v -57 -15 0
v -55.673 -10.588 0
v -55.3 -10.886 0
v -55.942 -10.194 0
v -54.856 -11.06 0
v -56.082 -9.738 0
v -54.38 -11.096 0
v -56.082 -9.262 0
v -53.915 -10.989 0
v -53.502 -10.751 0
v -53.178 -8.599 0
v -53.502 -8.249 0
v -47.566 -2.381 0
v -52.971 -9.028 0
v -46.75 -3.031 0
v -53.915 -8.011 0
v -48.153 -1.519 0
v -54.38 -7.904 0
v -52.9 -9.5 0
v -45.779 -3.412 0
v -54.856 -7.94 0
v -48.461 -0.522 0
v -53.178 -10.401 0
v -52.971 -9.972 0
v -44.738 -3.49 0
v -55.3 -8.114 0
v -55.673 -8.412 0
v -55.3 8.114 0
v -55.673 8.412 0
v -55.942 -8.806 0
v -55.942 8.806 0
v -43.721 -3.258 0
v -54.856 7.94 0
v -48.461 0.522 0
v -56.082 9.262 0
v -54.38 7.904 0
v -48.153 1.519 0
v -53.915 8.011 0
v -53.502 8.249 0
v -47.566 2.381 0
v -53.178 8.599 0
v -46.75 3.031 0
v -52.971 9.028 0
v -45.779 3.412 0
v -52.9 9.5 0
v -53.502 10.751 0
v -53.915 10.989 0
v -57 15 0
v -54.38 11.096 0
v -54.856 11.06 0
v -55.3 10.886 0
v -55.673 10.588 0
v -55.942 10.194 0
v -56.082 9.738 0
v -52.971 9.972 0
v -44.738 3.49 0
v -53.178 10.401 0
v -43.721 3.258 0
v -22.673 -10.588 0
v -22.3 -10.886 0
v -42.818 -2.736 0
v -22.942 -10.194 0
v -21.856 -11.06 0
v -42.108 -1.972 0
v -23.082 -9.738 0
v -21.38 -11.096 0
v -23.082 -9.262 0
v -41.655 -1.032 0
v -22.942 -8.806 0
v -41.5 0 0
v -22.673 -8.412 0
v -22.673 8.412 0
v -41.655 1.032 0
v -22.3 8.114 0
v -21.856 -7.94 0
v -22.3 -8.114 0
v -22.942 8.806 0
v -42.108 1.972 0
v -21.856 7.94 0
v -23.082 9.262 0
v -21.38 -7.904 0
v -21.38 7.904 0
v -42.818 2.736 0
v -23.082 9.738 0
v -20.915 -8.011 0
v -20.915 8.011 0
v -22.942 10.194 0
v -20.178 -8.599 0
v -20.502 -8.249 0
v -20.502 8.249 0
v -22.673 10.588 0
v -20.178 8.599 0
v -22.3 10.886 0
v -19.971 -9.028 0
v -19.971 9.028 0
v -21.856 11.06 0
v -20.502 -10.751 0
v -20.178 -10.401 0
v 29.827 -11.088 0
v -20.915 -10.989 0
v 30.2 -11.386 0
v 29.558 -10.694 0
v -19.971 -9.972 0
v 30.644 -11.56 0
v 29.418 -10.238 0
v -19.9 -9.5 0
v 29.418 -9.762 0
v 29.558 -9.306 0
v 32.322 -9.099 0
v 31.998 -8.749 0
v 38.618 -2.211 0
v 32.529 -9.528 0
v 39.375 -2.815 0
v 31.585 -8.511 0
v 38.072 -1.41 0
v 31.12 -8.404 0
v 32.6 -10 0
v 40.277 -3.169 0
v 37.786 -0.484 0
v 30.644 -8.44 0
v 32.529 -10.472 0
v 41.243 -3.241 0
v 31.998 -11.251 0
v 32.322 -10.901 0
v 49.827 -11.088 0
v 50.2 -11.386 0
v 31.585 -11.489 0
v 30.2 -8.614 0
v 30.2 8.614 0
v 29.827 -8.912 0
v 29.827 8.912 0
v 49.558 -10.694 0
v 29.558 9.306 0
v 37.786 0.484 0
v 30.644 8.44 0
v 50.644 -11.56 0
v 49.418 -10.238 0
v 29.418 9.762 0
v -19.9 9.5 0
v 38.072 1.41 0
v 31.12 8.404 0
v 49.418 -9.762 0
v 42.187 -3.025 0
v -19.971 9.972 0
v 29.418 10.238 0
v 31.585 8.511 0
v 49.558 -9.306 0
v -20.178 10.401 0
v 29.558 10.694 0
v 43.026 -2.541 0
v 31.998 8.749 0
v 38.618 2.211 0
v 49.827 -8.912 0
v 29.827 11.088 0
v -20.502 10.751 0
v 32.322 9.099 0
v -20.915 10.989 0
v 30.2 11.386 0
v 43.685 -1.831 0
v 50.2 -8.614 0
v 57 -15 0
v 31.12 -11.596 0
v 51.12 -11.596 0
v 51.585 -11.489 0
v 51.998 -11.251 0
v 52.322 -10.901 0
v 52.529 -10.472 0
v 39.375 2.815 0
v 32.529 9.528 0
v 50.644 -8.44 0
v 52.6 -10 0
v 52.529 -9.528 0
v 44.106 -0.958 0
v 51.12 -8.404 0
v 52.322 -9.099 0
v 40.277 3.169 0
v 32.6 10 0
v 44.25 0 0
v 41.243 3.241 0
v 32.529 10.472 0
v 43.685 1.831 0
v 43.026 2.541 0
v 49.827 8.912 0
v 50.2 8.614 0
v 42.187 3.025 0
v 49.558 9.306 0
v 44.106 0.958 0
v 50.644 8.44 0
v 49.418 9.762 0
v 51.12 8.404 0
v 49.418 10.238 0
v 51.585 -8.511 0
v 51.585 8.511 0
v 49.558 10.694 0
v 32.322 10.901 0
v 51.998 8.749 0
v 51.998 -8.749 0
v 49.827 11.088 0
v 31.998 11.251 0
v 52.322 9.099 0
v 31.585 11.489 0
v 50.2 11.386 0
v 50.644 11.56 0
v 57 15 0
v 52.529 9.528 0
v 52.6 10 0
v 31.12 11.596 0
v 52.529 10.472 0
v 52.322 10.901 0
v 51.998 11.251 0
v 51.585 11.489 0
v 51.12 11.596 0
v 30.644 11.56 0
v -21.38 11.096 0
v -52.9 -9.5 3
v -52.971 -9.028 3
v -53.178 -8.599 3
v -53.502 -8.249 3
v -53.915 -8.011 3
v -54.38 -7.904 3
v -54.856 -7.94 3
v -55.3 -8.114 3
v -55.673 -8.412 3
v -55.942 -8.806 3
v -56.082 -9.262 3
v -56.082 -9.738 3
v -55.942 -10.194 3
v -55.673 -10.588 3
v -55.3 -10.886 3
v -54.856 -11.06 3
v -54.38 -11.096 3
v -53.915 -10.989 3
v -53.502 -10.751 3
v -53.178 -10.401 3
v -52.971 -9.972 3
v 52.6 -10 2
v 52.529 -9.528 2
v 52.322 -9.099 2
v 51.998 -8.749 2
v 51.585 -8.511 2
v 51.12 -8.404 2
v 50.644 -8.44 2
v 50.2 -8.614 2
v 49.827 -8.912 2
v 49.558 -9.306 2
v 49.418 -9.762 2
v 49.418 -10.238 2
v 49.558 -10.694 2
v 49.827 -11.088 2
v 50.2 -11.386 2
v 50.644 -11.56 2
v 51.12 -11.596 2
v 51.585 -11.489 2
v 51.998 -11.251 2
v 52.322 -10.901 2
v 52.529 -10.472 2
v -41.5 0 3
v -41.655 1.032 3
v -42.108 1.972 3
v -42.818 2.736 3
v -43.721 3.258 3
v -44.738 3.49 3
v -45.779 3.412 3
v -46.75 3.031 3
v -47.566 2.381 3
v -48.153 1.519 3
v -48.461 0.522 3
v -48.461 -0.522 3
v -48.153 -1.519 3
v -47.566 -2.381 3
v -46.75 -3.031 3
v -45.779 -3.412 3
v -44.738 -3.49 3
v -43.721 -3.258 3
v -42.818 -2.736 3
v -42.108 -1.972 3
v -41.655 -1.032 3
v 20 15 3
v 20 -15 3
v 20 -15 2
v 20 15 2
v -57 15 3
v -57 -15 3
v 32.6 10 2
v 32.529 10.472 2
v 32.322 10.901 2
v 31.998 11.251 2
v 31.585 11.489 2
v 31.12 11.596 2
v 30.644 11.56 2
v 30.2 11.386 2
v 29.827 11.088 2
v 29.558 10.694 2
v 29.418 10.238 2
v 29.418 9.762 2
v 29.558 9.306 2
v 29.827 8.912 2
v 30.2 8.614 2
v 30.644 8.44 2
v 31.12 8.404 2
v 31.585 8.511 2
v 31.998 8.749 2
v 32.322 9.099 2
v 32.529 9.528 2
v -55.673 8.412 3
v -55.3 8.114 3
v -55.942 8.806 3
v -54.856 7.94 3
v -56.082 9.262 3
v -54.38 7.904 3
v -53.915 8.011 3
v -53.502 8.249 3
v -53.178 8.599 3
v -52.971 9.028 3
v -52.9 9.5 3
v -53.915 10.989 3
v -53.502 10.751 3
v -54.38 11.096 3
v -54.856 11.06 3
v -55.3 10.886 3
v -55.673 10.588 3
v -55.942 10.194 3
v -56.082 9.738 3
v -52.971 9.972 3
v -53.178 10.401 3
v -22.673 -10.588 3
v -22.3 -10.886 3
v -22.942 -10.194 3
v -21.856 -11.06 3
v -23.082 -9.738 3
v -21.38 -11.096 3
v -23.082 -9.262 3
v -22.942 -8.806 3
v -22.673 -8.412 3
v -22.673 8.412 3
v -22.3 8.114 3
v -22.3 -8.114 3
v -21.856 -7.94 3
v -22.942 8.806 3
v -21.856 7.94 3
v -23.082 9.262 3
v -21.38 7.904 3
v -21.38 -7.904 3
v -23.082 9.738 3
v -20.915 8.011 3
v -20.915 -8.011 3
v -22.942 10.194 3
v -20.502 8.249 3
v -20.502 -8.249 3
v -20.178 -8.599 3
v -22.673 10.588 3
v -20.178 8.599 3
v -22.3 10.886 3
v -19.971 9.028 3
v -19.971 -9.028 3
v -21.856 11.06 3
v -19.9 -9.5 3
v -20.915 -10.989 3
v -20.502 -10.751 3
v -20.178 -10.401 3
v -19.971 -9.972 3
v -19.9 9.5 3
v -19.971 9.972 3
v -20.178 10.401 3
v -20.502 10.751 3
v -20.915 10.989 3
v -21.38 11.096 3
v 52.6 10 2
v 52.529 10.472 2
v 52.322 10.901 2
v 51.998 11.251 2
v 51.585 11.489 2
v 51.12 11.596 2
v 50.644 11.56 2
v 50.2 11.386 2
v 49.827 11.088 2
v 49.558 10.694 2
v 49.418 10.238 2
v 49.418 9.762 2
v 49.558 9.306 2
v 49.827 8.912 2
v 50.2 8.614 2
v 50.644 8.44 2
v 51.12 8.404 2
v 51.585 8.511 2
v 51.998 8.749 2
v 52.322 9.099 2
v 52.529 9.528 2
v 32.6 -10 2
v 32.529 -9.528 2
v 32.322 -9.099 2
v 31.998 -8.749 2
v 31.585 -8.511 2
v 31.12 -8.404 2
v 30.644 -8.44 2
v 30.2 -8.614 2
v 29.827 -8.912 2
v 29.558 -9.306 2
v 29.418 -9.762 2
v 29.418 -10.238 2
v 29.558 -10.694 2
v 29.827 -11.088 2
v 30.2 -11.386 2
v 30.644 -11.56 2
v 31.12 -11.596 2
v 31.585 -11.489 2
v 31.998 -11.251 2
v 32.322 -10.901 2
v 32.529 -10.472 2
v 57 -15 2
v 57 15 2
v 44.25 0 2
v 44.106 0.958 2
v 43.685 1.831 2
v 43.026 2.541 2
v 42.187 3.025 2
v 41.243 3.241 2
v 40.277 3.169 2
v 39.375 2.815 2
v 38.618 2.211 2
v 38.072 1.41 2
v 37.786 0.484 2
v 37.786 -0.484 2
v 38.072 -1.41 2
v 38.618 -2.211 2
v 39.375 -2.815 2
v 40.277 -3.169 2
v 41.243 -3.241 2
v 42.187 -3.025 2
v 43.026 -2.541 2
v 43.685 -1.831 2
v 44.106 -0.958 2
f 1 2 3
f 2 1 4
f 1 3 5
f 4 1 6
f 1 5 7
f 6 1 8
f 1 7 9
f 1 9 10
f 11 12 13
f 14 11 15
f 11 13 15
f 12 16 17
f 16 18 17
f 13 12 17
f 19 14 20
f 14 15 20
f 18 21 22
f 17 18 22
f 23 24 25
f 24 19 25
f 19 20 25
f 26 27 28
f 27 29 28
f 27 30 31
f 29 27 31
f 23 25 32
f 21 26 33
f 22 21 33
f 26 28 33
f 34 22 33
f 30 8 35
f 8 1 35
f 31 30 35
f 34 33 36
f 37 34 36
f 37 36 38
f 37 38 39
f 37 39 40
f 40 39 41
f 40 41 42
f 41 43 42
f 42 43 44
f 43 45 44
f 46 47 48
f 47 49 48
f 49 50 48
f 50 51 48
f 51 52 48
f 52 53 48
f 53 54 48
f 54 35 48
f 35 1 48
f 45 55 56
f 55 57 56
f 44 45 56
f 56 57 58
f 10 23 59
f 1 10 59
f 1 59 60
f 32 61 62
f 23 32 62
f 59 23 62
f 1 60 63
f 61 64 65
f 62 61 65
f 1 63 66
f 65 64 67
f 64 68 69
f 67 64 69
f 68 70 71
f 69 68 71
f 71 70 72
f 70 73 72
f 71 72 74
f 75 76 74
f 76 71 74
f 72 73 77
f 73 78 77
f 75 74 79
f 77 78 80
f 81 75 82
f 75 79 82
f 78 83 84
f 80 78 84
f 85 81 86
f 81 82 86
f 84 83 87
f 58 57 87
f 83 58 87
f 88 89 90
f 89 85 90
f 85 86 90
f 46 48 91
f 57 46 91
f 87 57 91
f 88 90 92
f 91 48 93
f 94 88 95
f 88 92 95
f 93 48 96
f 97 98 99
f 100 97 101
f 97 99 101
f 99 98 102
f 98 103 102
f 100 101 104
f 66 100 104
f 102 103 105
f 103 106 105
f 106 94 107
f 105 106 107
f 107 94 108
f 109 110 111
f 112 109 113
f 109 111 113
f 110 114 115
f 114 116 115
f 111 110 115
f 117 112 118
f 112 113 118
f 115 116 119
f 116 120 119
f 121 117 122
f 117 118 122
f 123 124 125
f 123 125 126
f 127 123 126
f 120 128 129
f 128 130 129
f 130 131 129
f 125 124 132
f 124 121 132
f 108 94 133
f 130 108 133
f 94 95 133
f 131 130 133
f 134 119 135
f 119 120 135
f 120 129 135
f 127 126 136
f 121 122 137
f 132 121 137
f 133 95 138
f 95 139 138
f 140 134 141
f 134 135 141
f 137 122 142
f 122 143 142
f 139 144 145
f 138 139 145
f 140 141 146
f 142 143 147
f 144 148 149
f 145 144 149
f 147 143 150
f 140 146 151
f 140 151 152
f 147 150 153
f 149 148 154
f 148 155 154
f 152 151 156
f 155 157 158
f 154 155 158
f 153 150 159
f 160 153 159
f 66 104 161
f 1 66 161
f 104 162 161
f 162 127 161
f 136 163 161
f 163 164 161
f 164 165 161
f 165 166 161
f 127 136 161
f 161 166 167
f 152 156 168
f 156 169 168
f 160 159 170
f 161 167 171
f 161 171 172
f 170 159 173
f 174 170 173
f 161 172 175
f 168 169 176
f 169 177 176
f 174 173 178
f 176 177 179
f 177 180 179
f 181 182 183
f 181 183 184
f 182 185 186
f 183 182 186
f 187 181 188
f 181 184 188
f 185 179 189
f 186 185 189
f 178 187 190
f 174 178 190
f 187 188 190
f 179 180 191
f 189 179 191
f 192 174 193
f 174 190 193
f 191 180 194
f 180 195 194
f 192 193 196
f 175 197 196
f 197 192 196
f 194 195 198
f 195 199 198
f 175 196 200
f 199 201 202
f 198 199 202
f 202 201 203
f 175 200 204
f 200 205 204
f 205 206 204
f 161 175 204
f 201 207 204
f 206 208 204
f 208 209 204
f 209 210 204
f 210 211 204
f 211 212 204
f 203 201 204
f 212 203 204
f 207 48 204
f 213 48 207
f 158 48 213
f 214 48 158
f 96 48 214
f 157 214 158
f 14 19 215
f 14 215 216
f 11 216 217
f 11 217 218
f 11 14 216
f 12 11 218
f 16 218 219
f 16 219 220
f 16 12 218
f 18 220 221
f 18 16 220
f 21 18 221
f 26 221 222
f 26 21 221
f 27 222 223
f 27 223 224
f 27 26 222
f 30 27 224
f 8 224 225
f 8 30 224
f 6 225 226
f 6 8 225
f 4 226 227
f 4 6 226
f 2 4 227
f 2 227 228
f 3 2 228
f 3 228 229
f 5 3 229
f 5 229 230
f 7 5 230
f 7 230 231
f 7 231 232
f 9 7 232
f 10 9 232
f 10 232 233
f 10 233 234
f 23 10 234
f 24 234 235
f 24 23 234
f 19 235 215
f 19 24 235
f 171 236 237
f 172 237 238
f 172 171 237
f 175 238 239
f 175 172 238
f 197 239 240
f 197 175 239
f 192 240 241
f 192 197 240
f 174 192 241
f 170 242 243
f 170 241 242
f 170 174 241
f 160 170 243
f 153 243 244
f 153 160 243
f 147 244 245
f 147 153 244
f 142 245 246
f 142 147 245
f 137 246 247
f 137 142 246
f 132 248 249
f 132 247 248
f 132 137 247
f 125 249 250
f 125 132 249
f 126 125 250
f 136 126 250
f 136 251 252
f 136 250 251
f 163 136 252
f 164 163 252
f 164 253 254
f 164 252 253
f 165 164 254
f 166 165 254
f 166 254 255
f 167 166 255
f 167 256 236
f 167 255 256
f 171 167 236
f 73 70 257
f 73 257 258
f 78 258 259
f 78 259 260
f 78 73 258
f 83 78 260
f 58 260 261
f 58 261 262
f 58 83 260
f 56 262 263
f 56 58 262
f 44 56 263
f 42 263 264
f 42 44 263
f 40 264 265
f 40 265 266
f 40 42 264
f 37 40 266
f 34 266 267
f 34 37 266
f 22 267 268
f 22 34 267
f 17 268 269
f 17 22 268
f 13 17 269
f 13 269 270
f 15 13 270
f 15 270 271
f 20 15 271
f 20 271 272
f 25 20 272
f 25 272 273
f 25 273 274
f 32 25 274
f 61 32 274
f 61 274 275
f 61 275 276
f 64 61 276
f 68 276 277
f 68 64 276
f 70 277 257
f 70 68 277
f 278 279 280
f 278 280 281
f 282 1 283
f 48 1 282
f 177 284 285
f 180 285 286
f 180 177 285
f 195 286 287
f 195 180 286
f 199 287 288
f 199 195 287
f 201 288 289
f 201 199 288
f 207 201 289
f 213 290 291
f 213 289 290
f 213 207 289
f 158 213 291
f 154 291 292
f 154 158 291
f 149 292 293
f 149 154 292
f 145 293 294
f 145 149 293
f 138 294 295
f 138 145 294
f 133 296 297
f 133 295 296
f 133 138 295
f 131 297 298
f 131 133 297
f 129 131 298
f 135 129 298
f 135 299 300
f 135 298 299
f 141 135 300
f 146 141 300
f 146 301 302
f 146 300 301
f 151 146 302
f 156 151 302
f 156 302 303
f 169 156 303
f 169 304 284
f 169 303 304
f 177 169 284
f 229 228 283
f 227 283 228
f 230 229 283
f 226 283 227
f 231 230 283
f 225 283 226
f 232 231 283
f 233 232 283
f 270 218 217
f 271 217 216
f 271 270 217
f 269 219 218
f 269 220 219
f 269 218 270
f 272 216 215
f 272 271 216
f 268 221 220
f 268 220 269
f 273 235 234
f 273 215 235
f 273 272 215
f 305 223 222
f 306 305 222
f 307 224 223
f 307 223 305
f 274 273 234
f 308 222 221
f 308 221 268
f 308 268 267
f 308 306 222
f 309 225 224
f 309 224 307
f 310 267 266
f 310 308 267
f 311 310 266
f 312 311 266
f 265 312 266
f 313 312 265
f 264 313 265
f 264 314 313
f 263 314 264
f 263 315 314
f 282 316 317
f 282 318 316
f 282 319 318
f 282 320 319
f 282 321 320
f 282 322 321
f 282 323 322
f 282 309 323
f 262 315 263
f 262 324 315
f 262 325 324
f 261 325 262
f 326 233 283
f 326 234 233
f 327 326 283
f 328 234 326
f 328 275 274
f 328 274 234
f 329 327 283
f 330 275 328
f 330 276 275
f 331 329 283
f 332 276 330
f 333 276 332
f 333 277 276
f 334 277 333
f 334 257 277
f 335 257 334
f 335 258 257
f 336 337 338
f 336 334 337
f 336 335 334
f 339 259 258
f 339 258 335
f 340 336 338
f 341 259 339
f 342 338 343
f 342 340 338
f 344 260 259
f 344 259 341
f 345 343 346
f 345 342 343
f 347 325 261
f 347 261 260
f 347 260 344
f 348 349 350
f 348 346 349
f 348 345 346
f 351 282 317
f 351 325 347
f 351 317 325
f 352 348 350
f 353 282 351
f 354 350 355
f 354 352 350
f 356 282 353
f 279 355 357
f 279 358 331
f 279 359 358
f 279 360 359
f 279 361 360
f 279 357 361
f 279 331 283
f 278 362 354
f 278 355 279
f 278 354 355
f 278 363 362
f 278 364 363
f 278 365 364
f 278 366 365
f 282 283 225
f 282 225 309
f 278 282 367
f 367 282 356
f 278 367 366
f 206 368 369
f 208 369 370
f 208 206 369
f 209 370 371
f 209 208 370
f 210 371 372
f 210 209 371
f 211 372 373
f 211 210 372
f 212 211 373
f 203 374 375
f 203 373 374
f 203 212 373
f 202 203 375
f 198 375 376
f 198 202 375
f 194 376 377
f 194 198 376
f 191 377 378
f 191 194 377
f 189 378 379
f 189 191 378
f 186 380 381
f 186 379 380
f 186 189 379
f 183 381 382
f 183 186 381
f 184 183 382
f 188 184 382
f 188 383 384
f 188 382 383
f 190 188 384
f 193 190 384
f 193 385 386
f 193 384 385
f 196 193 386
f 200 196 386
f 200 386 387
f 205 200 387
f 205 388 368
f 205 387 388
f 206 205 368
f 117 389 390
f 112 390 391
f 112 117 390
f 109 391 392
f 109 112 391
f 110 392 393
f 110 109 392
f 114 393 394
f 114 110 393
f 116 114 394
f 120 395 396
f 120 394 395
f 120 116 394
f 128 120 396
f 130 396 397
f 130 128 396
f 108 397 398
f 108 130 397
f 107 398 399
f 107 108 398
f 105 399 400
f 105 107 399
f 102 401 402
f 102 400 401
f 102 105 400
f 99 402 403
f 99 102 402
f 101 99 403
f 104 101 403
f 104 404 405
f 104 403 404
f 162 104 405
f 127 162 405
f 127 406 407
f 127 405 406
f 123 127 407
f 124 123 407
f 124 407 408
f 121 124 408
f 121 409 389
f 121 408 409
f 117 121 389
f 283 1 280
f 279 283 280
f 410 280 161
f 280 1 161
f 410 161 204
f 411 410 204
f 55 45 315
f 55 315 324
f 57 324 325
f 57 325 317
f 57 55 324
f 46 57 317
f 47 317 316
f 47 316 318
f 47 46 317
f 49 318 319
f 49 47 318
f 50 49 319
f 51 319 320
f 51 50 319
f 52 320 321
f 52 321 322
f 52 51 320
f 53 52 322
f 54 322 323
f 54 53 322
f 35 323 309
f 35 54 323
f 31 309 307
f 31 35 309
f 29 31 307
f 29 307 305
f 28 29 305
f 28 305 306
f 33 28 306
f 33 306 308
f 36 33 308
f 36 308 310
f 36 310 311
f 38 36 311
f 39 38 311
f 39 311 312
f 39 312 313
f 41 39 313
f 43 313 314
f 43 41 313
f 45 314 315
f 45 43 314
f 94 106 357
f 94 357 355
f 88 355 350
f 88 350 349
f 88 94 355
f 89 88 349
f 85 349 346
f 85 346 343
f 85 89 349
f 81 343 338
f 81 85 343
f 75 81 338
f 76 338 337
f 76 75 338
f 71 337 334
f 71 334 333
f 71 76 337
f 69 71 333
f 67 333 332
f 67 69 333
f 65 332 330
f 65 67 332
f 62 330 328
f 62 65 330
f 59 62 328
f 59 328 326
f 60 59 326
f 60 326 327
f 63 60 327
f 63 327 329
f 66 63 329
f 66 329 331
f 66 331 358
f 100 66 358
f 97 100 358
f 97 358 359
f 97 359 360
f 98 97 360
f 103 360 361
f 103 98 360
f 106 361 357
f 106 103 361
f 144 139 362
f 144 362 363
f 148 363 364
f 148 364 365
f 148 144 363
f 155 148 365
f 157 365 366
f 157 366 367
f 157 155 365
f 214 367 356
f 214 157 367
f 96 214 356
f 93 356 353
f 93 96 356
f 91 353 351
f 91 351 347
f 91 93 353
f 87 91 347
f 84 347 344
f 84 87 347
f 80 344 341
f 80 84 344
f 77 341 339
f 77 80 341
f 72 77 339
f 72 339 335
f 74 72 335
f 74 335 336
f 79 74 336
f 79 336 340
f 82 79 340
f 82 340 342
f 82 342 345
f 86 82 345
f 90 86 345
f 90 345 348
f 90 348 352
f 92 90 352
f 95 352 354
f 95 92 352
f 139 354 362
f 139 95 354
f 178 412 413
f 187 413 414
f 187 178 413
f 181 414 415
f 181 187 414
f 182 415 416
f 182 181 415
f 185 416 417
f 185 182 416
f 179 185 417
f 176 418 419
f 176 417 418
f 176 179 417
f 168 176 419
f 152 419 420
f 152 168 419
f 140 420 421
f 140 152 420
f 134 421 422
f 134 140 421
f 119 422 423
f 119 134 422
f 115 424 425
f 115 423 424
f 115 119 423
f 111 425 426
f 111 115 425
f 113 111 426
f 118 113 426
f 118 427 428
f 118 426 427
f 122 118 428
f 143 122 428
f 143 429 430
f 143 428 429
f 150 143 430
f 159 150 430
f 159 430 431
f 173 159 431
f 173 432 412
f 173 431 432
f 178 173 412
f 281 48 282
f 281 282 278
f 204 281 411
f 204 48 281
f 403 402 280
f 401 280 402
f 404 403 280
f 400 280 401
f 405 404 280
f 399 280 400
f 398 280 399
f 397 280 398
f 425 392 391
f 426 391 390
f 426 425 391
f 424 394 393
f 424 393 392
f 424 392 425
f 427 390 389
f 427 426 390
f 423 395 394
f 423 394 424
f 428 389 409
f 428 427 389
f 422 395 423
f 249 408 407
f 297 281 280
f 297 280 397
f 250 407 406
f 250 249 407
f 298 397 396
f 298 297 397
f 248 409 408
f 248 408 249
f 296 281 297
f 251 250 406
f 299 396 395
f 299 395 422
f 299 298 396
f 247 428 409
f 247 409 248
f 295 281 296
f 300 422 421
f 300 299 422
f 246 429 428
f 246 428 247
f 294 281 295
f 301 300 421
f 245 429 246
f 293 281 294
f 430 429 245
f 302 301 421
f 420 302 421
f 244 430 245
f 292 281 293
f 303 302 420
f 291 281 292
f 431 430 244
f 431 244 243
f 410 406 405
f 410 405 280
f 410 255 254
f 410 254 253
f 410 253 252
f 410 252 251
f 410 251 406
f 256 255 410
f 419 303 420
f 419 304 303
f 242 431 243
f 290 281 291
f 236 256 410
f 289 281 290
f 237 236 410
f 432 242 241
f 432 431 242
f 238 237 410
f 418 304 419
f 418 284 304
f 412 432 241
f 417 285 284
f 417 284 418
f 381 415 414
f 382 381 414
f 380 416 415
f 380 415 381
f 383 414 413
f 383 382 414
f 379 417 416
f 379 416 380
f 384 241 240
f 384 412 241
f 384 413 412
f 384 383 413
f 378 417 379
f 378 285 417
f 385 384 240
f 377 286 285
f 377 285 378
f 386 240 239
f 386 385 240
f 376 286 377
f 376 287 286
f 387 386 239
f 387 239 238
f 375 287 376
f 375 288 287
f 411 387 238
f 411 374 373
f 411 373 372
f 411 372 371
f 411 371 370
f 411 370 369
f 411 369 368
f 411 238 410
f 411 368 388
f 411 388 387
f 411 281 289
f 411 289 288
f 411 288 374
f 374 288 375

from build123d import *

# Parameters (mm, degrees)
SKETCH_W     = 114
SKETCH_H     = 30
SKETCH_R     = 3.25
SKETCH_R_2   = 1.6
SKETCH_R_3   = 3.5
PAD_DEPTH    = 3
SKETCH001_W  = 44.703079
SKETCH001_H  = 47.60326
POCKET_DEPTH = 1


with BuildPart() as part:
    # Sketch → Pad (new body)
    with BuildSketch(Plane.XY):
        Rectangle(SKETCH_W, SKETCH_H)
        with Locations((41, 0)):
            Circle(SKETCH_R, mode=Mode.SUBTRACT)
        with Locations((51, 10)):
            Circle(SKETCH_R_2, mode=Mode.SUBTRACT)
        with Locations((31, 10)):
            Circle(SKETCH_R_2, mode=Mode.SUBTRACT)
        with Locations((31, -10)):
            Circle(SKETCH_R_2, mode=Mode.SUBTRACT)
        with Locations((51, -10)):
            Circle(SKETCH_R_2, mode=Mode.SUBTRACT)
        with Locations((-45, 0)):
            Circle(SKETCH_R_3, mode=Mode.SUBTRACT)
        with Locations((-54.5, 9.5)):
            Circle(SKETCH_R_2, mode=Mode.SUBTRACT)
        with Locations((-21.5, 9.5)):
            Circle(SKETCH_R_2, mode=Mode.SUBTRACT)
        with Locations((-21.5, -9.5)):
            Circle(SKETCH_R_2, mode=Mode.SUBTRACT)
        with Locations((-54.5, -9.5)):
            Circle(SKETCH_R_2, mode=Mode.SUBTRACT)
    extrude(amount=PAD_DEPTH)

    # Sketch001 (on Face16 of Pad) → Pocket (cut)
    with BuildSketch(Plane.XY.offset(3)):
        with Locations((42.35154, 0.341099)):
            Rectangle(SKETCH001_W, SKETCH001_H)
    extrude(amount=-POCKET_DEPTH, mode=Mode.SUBTRACT)


solid = part.part
